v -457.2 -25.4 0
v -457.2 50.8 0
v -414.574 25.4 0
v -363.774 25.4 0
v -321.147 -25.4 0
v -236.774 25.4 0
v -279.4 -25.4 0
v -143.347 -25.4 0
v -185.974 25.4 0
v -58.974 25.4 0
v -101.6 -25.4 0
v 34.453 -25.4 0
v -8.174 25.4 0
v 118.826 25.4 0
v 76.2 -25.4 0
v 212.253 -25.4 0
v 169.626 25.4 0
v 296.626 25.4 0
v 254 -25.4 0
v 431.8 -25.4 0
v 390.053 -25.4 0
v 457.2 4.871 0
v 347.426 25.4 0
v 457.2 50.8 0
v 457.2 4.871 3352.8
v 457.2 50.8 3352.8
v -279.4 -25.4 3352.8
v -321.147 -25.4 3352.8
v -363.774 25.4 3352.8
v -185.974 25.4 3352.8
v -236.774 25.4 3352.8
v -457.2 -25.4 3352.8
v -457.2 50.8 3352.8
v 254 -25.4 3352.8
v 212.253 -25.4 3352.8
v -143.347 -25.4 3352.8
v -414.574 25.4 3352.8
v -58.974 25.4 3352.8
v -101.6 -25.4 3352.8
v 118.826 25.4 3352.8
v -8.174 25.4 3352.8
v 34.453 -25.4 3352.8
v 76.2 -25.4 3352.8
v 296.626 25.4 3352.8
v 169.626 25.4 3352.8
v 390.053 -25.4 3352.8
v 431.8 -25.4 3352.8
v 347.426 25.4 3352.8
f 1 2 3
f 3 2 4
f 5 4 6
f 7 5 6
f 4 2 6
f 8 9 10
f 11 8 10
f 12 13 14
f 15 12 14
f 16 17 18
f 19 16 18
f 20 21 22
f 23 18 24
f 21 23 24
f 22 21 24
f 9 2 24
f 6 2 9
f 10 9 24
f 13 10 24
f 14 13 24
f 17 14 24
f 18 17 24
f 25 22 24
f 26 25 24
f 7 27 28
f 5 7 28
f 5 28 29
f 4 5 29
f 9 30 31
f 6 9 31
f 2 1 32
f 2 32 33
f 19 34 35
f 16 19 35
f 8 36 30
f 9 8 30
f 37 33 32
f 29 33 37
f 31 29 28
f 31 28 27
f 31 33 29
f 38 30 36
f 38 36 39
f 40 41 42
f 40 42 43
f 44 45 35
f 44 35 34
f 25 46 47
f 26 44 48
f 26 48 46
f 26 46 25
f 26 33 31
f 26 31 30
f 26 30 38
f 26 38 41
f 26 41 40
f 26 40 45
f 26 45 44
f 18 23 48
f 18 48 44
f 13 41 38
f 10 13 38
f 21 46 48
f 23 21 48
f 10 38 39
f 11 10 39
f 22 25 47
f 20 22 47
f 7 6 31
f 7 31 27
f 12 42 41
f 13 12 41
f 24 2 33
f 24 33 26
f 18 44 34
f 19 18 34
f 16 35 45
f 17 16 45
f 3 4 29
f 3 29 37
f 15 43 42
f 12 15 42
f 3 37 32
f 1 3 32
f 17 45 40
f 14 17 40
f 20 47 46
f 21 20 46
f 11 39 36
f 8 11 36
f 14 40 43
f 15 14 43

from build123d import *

# Parameters (mm, degrees)
F0_W     = 914.4
F0_H     = 101.6
F1_DEPTH = 3352.8
F3_DEPTH = 3352.801


with BuildPart() as f1:
    # F0 (on Top) → F1 (new body)
    with BuildSketch(Plane.XY):
        Rectangle(F0_W, F0_H)
    extrude(amount=F1_DEPTH)

    # F2 (on face) → F3 (cut, through all)
    with BuildSketch(Plane.XY.offset(3352.8)):
        Polygon((-414.573739, 25.4), (-457.2, -25.4), (-457.2, -50.8), (457.2, -50.8), (457.2, 4.870541), (431.8, -25.4), (390.052523, -25.4), (347.426261, 25.4), (296.626261, 25.4), (254, -25.4), (212.252523, -25.4), (169.626261, 25.4), (118.826261, 25.4), (76.2, -25.4), (34.452523, -25.4), (-8.173739, 25.4), (-58.973739, 25.4), (-101.6, -25.4), (-143.347477, -25.4), (-185.973739, 25.4), (-236.773739, 25.4), (-279.4, -25.4), (-321.147477, -25.4), (-363.773739, 25.4), align=None)
    extrude(amount=-F3_DEPTH, mode=Mode.SUBTRACT)


solid = f1.part
